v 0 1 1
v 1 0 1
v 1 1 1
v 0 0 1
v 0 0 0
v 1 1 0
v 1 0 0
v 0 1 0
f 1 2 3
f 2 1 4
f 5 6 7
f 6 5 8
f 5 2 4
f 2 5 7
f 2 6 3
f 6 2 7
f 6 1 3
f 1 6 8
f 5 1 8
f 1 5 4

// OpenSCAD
/* Guardas parametricas da arquitetura. Resultado: um cubo de 1 mm. */
include <00_Parametros.scad>;

inner_gap=x_rail_spacing-base_w;
beam_slenderness=y_rail_length/y_beam_h;

assert(inner_gap >= paper_height+4,
       "Papel A5 invade os trilhos X");
assert(x_rail_length <= 250 && y_rail_length <= 250,
       "Peca longa deixa de caber na Bambu Lab A1 com brim");
assert(y_beam_wall >= 1.6,
       "Parede da viga abaixo de quatro linhas com bico 0,4");
assert(y_beam_rib_pitch <= 2*y_beam_h,
       "Diafragmas muito afastados para controlar torcao local");
assert(beam_slenderness <= 10.5,
       "Viga excessivamente esbelta");
assert(passive_float >= 0.5,
       "Sapata passiva sem curso para absorver erro de paralelismo");
assert(beam_key_w >= 2*wall_screw+8,
       "Chaveta da viga estreita demais ao redor do M3");

cube([1,1,1]);
